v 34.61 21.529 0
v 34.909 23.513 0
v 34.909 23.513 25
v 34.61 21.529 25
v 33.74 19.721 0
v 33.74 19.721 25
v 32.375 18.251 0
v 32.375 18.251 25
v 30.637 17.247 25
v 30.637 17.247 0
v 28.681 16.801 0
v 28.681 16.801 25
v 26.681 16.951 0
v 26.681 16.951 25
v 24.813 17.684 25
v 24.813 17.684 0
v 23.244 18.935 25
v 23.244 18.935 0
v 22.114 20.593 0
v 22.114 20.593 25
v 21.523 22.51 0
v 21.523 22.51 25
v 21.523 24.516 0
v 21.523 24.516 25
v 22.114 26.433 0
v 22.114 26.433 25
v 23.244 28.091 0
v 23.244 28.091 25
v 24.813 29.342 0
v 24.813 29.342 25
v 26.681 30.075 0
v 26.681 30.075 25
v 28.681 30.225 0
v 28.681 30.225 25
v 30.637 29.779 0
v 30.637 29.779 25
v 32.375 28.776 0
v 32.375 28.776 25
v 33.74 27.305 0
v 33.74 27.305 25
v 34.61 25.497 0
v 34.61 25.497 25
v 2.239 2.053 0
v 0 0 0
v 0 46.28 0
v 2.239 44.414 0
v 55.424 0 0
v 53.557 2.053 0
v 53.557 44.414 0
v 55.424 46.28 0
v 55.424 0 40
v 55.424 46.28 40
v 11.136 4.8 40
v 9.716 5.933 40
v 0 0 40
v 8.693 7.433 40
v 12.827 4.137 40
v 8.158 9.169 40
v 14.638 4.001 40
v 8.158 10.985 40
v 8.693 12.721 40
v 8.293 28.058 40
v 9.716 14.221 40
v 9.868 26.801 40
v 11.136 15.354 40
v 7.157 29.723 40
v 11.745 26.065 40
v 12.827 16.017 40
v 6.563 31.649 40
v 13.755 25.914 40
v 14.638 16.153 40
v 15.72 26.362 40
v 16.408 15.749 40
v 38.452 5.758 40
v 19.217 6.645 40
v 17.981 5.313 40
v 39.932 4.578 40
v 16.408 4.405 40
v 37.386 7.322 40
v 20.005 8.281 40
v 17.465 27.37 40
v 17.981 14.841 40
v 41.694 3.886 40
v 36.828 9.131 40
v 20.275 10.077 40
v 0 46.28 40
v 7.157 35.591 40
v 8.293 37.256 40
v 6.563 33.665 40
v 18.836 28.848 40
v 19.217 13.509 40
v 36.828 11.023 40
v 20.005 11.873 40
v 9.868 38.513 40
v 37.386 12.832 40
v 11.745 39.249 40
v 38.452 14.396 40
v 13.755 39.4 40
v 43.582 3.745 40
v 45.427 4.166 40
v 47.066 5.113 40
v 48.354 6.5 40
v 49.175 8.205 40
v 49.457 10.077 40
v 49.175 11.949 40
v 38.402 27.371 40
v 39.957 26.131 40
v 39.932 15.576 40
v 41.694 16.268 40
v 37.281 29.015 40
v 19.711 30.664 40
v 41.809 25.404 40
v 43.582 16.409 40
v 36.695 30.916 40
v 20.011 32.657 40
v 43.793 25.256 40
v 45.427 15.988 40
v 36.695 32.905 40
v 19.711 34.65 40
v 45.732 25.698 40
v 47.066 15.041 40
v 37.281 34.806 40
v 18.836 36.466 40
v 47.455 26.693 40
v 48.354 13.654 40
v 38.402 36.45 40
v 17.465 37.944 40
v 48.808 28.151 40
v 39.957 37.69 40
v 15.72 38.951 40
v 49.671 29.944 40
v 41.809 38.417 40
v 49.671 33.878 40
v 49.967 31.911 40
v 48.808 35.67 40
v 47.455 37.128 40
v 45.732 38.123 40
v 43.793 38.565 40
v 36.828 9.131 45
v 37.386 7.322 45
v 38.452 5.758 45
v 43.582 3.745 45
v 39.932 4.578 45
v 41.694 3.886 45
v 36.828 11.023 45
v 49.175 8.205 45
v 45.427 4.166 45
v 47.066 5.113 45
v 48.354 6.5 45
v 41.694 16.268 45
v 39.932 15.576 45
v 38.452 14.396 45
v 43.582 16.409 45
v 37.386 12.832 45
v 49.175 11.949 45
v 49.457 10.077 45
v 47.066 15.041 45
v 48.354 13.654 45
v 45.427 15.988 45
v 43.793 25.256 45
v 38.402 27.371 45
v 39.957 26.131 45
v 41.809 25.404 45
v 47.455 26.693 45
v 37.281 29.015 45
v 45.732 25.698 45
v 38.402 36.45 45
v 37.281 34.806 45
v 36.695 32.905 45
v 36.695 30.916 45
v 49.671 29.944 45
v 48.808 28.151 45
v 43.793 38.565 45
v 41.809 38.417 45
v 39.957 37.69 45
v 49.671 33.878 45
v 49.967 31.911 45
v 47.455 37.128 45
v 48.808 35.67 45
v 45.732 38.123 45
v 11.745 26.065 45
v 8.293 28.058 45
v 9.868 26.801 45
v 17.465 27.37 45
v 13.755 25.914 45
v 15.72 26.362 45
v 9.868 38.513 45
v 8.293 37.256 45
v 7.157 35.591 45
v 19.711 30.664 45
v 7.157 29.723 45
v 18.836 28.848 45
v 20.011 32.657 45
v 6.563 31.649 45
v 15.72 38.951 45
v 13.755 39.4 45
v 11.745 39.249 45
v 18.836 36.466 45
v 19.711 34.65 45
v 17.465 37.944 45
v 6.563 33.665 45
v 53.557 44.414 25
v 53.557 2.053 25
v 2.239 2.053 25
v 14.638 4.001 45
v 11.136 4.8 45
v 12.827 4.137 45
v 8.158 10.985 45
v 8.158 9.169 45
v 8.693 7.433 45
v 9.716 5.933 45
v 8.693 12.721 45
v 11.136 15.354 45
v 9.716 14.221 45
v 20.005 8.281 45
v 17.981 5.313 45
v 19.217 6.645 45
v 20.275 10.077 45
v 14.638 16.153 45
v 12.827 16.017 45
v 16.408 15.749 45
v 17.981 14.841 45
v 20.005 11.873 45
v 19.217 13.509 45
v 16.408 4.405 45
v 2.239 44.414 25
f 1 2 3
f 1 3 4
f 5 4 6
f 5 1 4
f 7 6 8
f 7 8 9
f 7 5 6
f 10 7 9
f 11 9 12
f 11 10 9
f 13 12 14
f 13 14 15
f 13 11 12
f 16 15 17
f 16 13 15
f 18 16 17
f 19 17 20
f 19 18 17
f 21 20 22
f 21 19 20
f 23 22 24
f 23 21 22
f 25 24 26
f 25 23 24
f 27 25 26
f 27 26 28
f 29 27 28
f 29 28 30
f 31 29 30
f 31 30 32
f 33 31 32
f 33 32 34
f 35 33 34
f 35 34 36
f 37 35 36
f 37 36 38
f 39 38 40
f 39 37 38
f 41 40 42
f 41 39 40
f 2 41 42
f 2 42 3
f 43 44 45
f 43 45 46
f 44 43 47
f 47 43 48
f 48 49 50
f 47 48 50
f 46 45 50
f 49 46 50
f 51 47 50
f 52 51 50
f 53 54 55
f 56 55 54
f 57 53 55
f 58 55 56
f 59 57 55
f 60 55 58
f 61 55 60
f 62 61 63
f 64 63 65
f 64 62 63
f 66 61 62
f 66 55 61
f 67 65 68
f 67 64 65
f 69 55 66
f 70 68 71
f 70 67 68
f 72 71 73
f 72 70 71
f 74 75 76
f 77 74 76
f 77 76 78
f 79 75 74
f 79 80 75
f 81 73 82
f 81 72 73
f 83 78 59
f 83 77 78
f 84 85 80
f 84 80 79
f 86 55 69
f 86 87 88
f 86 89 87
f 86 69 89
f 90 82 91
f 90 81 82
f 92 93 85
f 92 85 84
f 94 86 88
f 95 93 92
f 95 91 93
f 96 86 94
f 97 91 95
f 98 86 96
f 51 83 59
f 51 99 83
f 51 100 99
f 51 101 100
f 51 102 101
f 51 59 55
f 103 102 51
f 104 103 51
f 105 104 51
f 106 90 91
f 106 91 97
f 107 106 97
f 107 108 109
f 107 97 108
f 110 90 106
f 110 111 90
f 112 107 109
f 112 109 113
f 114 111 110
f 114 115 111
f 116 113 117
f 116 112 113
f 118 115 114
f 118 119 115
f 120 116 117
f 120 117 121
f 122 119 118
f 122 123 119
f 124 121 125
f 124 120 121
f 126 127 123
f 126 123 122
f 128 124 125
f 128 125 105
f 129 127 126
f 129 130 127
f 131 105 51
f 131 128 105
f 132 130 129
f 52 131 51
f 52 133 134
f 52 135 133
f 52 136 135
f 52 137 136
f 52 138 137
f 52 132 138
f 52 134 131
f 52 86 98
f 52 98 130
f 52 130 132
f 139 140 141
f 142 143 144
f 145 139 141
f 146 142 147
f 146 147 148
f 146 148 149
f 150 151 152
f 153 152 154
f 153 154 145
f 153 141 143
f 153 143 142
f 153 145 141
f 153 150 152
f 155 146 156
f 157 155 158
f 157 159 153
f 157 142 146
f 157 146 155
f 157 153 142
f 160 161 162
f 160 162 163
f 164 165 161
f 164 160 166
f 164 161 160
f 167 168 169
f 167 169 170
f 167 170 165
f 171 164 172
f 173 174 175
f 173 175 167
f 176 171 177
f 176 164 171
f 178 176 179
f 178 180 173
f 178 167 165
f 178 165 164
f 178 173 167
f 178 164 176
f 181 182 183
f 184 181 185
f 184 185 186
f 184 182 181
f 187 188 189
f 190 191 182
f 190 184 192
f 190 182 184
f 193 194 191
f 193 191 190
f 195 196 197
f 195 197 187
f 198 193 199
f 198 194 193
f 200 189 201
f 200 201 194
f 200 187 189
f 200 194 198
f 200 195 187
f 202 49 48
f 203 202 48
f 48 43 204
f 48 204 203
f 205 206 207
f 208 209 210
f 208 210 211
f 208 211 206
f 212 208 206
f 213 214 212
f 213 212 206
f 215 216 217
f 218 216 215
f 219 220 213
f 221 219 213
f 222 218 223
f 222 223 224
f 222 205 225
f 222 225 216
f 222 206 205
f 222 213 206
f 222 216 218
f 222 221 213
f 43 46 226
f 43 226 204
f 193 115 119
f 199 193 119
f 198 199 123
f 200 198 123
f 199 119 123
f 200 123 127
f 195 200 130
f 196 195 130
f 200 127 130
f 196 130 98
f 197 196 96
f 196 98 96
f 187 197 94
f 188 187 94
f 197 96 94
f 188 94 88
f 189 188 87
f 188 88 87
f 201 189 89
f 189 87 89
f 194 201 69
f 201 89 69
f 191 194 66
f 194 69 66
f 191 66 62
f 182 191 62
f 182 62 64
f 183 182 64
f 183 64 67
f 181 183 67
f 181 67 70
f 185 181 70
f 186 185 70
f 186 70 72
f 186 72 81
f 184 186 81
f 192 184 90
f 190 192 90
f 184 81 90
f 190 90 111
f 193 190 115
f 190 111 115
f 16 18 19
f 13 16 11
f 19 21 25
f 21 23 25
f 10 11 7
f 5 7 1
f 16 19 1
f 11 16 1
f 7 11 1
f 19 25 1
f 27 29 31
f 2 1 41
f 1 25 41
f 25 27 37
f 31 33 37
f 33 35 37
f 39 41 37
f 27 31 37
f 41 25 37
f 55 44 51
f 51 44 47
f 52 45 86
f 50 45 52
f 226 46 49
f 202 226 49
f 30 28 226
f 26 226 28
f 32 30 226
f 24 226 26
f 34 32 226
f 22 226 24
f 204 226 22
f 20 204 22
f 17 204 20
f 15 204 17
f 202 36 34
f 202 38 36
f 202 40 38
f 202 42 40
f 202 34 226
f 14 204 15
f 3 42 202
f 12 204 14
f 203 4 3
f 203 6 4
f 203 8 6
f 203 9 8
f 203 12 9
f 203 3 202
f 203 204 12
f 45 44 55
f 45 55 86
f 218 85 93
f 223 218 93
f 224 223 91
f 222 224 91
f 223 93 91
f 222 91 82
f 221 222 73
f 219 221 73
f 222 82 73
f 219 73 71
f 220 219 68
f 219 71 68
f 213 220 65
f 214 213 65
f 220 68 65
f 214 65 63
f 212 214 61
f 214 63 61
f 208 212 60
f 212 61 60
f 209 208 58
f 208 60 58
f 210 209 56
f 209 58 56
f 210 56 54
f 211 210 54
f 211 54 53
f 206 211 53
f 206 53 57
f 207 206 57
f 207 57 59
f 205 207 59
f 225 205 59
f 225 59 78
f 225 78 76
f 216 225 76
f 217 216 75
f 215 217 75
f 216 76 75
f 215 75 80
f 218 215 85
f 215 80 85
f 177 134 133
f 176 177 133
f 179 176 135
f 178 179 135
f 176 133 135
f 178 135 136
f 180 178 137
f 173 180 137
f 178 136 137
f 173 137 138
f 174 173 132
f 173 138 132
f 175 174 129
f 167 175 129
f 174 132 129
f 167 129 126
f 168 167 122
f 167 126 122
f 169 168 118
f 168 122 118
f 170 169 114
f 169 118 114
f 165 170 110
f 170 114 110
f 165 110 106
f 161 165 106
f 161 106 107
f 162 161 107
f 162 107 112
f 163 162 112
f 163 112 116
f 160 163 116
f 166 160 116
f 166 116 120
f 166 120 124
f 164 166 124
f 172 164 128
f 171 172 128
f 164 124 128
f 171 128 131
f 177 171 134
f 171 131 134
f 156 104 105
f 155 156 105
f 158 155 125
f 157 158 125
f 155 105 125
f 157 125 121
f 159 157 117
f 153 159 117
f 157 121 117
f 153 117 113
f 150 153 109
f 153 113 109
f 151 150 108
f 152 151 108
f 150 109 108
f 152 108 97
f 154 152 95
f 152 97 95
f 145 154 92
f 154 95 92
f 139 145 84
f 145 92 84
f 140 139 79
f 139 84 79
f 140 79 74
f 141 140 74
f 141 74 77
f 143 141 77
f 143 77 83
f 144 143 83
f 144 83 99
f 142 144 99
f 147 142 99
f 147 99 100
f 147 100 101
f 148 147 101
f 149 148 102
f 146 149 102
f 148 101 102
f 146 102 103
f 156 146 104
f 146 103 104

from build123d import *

# Parameters (mm, degrees)
F0_W     = 55.42358
F0_H     = 46.27962
F1_DEPTH = 40
F2_R     = 6.761924
F2_R_2   = 6.673414
F2_R_3   = 6.092798
F2_R_4   = 6.349814
F3_DEPTH = 5
F4_W     = 51.318126
F4_H     = 42.360786
F4_R     = 6.730957
F5_DEPTH = 25


with BuildPart() as f1:
    # F0 (on Top) → F1 (new body)
    with BuildSketch(Plane.XY):
        with Locations((27.71179, 23.13981)):
            Rectangle(F0_W, F0_H)
    extrude(amount=F1_DEPTH)

    # F2 (on face) → F3 (join)
    with BuildSketch(Plane.XY.offset(40)):
        with Locations((13.249407, 32.656994)):
            Circle(F2_R)
        with Locations((43.293841, 31.910546)):
            Circle(F2_R_2)
        with Locations((14.182466, 10.077015)):
            Circle(F2_R_3)
        with Locations((43.10723, 10.077015)):
            Circle(F2_R_4)
    extrude(amount=F3_DEPTH)

    # F4 (on face) → F5 (cut)
    with BuildSketch(Plane(origin=(0, 0, 0), x_dir=(1, 0, 0), z_dir=(0, 0, -1))):
        with Locations((27.8984, -23.233118)):
            Rectangle(F4_W, F4_H)
        with Locations((28.178319, -23.513034)):
            Circle(F4_R, mode=Mode.SUBTRACT)
    extrude(amount=-F5_DEPTH, mode=Mode.SUBTRACT)


solid = f1.part
